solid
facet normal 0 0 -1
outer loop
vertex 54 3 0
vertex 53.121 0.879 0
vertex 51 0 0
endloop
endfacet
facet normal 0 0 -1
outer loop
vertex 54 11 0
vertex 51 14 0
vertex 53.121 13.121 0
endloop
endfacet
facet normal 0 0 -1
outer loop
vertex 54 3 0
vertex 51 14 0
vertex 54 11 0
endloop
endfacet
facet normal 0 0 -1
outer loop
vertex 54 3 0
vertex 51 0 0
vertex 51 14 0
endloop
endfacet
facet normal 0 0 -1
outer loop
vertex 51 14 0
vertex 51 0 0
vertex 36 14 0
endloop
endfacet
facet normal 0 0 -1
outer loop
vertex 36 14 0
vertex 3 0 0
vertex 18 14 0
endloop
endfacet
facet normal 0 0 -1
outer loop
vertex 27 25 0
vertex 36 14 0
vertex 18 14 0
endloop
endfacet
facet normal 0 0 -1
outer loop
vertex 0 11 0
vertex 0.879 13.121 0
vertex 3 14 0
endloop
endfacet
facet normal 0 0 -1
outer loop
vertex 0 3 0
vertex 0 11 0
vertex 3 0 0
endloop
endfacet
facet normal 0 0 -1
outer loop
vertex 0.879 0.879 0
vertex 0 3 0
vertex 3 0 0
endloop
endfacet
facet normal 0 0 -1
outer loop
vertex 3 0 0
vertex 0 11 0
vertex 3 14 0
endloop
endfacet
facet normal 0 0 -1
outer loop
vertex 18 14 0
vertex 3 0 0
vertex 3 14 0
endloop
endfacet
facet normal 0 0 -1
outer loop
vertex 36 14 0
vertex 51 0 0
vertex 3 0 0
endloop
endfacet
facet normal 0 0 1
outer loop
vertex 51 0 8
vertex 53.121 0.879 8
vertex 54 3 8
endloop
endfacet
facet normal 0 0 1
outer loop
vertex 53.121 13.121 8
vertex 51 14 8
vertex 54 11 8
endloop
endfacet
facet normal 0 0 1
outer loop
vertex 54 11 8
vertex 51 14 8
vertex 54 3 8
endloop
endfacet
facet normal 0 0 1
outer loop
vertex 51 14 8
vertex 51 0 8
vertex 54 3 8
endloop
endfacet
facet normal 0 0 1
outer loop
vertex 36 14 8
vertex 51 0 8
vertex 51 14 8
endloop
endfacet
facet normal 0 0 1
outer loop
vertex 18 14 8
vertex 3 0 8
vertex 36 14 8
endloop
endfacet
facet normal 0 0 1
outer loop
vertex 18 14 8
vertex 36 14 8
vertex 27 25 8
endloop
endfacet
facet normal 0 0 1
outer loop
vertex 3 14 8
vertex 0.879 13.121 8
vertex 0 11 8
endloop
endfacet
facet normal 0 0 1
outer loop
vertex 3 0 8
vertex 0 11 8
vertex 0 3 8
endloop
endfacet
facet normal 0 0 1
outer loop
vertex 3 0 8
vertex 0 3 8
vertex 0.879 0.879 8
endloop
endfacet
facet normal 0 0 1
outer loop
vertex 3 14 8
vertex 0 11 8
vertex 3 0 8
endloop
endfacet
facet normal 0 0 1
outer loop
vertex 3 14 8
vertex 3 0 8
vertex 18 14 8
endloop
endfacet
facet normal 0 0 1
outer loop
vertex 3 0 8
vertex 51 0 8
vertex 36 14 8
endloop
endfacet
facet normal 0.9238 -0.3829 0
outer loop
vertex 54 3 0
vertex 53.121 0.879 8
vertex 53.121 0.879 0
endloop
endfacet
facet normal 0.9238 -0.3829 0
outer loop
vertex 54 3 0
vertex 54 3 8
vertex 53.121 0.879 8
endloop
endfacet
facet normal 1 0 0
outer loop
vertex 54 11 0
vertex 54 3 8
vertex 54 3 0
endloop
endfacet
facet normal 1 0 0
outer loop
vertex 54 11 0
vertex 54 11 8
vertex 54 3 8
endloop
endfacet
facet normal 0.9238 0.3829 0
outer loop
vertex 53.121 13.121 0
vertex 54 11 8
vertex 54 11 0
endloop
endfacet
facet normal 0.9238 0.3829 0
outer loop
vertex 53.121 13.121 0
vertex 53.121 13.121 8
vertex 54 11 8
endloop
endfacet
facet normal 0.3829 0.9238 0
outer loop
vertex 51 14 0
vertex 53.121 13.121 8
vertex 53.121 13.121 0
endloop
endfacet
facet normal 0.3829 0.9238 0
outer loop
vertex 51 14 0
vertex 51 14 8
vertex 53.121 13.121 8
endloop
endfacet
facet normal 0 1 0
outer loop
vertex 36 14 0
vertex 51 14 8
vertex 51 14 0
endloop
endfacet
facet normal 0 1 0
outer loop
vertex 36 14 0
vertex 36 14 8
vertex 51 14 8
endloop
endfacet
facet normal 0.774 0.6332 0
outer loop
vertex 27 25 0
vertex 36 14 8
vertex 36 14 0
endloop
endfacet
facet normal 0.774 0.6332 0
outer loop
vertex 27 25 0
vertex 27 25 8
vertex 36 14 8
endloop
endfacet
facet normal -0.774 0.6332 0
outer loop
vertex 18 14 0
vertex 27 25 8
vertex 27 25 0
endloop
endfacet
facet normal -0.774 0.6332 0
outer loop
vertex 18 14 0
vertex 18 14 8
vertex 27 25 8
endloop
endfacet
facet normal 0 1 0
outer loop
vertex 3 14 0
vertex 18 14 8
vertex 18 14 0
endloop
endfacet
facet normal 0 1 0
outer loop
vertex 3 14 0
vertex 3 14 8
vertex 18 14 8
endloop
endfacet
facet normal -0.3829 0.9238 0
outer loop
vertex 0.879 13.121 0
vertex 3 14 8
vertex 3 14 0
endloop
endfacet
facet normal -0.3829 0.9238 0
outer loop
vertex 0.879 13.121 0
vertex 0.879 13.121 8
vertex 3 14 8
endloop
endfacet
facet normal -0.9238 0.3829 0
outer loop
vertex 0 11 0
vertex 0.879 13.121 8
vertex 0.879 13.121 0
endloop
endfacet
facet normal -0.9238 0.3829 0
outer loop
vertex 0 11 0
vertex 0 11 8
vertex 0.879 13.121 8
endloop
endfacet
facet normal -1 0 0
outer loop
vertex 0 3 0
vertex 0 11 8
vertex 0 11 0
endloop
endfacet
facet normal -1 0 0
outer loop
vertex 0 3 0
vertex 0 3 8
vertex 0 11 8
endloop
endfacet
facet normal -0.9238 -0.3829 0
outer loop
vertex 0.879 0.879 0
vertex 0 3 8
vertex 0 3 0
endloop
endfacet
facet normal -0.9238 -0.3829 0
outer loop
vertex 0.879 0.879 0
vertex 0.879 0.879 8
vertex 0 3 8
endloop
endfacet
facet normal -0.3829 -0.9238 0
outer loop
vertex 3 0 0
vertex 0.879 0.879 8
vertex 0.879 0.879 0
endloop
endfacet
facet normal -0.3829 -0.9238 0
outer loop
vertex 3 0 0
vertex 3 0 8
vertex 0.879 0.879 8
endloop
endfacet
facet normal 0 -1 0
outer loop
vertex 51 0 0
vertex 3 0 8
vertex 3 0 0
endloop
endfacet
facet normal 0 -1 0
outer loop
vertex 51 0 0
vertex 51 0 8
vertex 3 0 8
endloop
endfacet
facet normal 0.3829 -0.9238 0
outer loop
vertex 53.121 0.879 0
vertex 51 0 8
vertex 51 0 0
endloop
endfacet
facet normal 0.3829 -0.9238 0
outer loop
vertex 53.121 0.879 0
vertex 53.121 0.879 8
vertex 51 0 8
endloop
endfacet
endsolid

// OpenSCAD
$fn = 32;

// ----------------------------------------------------------------------
// Ratchet pawl: 54 x 14 mm body, beak 11 mm сверху
// ----------------------------------------------------------------------

// --- parameters (mm) ---
profile_height = 8;       // extrusion height
profile_points = 15;      // points of the closed outline

profile = [[0, 3], [0.879, 0.879], [3, 0], [51, 0], [53.121, 0.879], [54, 3], [54, 11], [53.121, 13.121], [51, 14], [36, 14], [27, 25], [18, 14], [3, 14], [0.879, 13.121], [0, 11]];  // single closed polygon, 15 points, counter clockwise

// --- the one profile operation ---
linear_extrude(height = profile_height) polygon(points = profile);
